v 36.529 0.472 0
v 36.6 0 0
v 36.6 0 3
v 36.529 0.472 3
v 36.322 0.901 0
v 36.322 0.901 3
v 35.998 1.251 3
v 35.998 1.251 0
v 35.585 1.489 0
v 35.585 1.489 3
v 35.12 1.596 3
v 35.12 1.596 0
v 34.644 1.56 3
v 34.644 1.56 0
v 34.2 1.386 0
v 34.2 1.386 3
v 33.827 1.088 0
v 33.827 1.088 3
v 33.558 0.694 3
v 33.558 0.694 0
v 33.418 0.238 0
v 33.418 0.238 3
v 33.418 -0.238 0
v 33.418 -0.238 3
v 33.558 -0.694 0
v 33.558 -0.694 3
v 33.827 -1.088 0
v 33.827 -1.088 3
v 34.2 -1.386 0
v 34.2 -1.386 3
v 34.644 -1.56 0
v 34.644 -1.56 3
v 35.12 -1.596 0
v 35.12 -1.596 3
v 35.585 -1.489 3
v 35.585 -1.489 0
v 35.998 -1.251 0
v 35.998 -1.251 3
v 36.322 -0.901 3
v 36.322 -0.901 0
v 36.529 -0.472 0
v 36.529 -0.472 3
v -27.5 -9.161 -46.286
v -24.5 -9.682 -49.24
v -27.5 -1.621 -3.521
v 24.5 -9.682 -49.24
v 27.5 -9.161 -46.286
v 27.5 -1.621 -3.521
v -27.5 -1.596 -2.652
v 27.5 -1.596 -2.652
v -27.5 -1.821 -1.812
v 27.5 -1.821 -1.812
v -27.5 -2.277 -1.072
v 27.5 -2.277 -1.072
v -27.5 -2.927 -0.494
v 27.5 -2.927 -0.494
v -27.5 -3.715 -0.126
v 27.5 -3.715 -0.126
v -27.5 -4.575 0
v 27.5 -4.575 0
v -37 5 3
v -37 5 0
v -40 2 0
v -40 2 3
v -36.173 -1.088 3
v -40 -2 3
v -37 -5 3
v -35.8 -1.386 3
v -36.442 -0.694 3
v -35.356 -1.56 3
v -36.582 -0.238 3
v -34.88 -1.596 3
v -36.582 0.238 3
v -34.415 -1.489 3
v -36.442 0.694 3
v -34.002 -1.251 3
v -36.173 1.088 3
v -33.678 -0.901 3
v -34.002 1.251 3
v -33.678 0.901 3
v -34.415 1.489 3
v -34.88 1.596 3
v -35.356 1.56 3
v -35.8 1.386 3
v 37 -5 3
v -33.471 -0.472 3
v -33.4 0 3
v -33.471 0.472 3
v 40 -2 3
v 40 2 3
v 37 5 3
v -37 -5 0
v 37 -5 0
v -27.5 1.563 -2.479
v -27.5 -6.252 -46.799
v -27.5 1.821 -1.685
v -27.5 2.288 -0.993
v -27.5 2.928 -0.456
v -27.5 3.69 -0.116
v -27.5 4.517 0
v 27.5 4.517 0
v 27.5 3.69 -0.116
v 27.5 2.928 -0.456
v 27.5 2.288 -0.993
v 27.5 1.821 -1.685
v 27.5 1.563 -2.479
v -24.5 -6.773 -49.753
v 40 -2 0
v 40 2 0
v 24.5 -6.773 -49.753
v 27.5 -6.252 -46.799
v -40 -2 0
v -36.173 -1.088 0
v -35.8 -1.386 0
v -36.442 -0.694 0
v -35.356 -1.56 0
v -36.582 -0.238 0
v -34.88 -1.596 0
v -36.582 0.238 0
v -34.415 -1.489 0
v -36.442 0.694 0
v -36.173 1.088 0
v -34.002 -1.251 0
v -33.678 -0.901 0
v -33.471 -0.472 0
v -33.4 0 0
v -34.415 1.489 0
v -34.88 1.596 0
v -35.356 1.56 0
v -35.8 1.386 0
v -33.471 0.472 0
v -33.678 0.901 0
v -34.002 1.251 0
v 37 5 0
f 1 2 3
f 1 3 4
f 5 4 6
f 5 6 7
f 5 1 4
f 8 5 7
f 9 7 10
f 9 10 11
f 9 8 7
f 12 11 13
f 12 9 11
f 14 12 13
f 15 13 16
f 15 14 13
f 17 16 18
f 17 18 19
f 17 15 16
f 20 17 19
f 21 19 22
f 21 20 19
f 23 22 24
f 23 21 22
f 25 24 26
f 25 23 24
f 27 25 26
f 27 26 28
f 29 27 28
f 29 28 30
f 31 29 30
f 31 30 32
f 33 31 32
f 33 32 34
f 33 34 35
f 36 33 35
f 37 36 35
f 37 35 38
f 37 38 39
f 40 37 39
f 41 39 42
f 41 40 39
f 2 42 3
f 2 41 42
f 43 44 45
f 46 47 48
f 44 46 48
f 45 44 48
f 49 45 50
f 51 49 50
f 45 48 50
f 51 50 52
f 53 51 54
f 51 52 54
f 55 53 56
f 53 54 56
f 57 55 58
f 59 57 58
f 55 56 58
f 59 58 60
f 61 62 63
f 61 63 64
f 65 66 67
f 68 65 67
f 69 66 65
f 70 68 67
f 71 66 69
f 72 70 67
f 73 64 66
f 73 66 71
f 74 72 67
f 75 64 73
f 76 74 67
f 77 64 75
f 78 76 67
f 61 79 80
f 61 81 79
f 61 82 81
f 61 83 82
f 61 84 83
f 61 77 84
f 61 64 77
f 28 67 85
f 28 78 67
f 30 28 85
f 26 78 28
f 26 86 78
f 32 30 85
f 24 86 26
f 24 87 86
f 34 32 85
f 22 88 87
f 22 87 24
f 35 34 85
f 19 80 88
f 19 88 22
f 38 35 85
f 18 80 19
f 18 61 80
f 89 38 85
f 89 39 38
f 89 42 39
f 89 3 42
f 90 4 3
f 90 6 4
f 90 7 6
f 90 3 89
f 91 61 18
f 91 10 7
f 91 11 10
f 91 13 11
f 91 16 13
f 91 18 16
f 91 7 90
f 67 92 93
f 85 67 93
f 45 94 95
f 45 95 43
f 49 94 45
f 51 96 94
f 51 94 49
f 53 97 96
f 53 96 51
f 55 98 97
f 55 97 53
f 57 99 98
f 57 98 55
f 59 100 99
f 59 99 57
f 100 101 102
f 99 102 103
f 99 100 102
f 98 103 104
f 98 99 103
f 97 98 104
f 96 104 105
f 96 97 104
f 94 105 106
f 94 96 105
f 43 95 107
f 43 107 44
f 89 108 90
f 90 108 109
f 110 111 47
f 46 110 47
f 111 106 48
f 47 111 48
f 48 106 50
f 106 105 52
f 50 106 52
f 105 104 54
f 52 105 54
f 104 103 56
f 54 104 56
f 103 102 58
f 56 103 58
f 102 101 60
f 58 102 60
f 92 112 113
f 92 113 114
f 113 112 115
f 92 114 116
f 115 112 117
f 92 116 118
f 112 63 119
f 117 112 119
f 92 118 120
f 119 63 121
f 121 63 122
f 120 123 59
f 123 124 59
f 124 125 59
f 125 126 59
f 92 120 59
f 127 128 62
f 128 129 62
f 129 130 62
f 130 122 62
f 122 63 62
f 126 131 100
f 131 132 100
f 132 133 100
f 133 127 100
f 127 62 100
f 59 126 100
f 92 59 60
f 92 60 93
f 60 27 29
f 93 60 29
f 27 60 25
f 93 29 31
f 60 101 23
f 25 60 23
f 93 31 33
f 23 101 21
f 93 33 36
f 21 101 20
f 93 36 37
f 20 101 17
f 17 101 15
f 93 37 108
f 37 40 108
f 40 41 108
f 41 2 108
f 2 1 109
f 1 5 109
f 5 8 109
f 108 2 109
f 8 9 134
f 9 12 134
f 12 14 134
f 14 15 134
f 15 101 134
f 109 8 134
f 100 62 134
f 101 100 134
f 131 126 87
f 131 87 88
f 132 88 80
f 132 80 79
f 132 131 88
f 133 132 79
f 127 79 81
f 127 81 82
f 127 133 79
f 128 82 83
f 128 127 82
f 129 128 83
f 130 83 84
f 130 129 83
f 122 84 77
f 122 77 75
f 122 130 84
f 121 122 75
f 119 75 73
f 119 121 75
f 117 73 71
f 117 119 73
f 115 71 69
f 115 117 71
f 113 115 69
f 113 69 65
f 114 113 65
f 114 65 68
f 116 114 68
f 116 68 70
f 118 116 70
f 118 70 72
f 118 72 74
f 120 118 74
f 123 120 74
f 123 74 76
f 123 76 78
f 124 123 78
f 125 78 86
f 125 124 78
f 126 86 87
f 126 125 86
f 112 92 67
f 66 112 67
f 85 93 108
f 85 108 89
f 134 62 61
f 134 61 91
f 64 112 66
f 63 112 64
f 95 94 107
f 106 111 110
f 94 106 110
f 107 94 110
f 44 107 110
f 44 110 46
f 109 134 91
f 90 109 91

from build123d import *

# Parameters (mm, degrees)
SKETCH243_W     = 80
SKETCH243_H     = 10
SKETCH243_R     = 1.6
PAD126_DEPTH    = 3
CHAMFER087_SIZE = 3
PAD127_DEPTH    = 27.5
CHAMFER088_SIZE = 3
FILLET084_R     = 3


with BuildPart() as part:
    # Sketch243 → Pad126 (new body)
    with BuildSketch(Plane.XY):
        Rectangle(SKETCH243_W, SKETCH243_H)
        with Locations((35, 0)):
            Circle(SKETCH243_R, mode=Mode.SUBTRACT)
        with Locations((-35, 0)):
            Circle(SKETCH243_R, mode=Mode.SUBTRACT)
    extrude(amount=PAD126_DEPTH)

    # Chamfer087
    chamfer087_edges = [part.edges().sort_by_distance(p)[0] for p in [
        (40, -5, 1.5),
        (40, 5, 1.5),
        (-40, -5, 1.5),
        (-40, 5, 1.5),
    ]]
    chamfer(chamfer087_edges, length=CHAMFER087_SIZE)

    # Sketch244 → Pad127 (join, symmetric)
    with BuildSketch(Plane.YZ):
        Polygon((-1, 0), (2, 0), (-6.77287, -49.753418), (-9.682409, -49.240388), align=None)
    extrude(amount=PAD127_DEPTH, both=True)

    # Chamfer088
    chamfer088_edges = [part.edges().sort_by_distance(p)[0] for p in [
        (-27.5, -8.227639, -49.496903),
        (27.5, -8.227639, -49.496903),
    ]]
    chamfer(chamfer088_edges, length=CHAMFER088_SIZE)

    # Fillet084
    fillet084_edges = [part.edges().sort_by_distance(p)[0] for p in [
        (0, -1, 0),
        (0, 2, 0),
    ]]
    fillet(fillet084_edges, radius=FILLET084_R)


solid = part.part
